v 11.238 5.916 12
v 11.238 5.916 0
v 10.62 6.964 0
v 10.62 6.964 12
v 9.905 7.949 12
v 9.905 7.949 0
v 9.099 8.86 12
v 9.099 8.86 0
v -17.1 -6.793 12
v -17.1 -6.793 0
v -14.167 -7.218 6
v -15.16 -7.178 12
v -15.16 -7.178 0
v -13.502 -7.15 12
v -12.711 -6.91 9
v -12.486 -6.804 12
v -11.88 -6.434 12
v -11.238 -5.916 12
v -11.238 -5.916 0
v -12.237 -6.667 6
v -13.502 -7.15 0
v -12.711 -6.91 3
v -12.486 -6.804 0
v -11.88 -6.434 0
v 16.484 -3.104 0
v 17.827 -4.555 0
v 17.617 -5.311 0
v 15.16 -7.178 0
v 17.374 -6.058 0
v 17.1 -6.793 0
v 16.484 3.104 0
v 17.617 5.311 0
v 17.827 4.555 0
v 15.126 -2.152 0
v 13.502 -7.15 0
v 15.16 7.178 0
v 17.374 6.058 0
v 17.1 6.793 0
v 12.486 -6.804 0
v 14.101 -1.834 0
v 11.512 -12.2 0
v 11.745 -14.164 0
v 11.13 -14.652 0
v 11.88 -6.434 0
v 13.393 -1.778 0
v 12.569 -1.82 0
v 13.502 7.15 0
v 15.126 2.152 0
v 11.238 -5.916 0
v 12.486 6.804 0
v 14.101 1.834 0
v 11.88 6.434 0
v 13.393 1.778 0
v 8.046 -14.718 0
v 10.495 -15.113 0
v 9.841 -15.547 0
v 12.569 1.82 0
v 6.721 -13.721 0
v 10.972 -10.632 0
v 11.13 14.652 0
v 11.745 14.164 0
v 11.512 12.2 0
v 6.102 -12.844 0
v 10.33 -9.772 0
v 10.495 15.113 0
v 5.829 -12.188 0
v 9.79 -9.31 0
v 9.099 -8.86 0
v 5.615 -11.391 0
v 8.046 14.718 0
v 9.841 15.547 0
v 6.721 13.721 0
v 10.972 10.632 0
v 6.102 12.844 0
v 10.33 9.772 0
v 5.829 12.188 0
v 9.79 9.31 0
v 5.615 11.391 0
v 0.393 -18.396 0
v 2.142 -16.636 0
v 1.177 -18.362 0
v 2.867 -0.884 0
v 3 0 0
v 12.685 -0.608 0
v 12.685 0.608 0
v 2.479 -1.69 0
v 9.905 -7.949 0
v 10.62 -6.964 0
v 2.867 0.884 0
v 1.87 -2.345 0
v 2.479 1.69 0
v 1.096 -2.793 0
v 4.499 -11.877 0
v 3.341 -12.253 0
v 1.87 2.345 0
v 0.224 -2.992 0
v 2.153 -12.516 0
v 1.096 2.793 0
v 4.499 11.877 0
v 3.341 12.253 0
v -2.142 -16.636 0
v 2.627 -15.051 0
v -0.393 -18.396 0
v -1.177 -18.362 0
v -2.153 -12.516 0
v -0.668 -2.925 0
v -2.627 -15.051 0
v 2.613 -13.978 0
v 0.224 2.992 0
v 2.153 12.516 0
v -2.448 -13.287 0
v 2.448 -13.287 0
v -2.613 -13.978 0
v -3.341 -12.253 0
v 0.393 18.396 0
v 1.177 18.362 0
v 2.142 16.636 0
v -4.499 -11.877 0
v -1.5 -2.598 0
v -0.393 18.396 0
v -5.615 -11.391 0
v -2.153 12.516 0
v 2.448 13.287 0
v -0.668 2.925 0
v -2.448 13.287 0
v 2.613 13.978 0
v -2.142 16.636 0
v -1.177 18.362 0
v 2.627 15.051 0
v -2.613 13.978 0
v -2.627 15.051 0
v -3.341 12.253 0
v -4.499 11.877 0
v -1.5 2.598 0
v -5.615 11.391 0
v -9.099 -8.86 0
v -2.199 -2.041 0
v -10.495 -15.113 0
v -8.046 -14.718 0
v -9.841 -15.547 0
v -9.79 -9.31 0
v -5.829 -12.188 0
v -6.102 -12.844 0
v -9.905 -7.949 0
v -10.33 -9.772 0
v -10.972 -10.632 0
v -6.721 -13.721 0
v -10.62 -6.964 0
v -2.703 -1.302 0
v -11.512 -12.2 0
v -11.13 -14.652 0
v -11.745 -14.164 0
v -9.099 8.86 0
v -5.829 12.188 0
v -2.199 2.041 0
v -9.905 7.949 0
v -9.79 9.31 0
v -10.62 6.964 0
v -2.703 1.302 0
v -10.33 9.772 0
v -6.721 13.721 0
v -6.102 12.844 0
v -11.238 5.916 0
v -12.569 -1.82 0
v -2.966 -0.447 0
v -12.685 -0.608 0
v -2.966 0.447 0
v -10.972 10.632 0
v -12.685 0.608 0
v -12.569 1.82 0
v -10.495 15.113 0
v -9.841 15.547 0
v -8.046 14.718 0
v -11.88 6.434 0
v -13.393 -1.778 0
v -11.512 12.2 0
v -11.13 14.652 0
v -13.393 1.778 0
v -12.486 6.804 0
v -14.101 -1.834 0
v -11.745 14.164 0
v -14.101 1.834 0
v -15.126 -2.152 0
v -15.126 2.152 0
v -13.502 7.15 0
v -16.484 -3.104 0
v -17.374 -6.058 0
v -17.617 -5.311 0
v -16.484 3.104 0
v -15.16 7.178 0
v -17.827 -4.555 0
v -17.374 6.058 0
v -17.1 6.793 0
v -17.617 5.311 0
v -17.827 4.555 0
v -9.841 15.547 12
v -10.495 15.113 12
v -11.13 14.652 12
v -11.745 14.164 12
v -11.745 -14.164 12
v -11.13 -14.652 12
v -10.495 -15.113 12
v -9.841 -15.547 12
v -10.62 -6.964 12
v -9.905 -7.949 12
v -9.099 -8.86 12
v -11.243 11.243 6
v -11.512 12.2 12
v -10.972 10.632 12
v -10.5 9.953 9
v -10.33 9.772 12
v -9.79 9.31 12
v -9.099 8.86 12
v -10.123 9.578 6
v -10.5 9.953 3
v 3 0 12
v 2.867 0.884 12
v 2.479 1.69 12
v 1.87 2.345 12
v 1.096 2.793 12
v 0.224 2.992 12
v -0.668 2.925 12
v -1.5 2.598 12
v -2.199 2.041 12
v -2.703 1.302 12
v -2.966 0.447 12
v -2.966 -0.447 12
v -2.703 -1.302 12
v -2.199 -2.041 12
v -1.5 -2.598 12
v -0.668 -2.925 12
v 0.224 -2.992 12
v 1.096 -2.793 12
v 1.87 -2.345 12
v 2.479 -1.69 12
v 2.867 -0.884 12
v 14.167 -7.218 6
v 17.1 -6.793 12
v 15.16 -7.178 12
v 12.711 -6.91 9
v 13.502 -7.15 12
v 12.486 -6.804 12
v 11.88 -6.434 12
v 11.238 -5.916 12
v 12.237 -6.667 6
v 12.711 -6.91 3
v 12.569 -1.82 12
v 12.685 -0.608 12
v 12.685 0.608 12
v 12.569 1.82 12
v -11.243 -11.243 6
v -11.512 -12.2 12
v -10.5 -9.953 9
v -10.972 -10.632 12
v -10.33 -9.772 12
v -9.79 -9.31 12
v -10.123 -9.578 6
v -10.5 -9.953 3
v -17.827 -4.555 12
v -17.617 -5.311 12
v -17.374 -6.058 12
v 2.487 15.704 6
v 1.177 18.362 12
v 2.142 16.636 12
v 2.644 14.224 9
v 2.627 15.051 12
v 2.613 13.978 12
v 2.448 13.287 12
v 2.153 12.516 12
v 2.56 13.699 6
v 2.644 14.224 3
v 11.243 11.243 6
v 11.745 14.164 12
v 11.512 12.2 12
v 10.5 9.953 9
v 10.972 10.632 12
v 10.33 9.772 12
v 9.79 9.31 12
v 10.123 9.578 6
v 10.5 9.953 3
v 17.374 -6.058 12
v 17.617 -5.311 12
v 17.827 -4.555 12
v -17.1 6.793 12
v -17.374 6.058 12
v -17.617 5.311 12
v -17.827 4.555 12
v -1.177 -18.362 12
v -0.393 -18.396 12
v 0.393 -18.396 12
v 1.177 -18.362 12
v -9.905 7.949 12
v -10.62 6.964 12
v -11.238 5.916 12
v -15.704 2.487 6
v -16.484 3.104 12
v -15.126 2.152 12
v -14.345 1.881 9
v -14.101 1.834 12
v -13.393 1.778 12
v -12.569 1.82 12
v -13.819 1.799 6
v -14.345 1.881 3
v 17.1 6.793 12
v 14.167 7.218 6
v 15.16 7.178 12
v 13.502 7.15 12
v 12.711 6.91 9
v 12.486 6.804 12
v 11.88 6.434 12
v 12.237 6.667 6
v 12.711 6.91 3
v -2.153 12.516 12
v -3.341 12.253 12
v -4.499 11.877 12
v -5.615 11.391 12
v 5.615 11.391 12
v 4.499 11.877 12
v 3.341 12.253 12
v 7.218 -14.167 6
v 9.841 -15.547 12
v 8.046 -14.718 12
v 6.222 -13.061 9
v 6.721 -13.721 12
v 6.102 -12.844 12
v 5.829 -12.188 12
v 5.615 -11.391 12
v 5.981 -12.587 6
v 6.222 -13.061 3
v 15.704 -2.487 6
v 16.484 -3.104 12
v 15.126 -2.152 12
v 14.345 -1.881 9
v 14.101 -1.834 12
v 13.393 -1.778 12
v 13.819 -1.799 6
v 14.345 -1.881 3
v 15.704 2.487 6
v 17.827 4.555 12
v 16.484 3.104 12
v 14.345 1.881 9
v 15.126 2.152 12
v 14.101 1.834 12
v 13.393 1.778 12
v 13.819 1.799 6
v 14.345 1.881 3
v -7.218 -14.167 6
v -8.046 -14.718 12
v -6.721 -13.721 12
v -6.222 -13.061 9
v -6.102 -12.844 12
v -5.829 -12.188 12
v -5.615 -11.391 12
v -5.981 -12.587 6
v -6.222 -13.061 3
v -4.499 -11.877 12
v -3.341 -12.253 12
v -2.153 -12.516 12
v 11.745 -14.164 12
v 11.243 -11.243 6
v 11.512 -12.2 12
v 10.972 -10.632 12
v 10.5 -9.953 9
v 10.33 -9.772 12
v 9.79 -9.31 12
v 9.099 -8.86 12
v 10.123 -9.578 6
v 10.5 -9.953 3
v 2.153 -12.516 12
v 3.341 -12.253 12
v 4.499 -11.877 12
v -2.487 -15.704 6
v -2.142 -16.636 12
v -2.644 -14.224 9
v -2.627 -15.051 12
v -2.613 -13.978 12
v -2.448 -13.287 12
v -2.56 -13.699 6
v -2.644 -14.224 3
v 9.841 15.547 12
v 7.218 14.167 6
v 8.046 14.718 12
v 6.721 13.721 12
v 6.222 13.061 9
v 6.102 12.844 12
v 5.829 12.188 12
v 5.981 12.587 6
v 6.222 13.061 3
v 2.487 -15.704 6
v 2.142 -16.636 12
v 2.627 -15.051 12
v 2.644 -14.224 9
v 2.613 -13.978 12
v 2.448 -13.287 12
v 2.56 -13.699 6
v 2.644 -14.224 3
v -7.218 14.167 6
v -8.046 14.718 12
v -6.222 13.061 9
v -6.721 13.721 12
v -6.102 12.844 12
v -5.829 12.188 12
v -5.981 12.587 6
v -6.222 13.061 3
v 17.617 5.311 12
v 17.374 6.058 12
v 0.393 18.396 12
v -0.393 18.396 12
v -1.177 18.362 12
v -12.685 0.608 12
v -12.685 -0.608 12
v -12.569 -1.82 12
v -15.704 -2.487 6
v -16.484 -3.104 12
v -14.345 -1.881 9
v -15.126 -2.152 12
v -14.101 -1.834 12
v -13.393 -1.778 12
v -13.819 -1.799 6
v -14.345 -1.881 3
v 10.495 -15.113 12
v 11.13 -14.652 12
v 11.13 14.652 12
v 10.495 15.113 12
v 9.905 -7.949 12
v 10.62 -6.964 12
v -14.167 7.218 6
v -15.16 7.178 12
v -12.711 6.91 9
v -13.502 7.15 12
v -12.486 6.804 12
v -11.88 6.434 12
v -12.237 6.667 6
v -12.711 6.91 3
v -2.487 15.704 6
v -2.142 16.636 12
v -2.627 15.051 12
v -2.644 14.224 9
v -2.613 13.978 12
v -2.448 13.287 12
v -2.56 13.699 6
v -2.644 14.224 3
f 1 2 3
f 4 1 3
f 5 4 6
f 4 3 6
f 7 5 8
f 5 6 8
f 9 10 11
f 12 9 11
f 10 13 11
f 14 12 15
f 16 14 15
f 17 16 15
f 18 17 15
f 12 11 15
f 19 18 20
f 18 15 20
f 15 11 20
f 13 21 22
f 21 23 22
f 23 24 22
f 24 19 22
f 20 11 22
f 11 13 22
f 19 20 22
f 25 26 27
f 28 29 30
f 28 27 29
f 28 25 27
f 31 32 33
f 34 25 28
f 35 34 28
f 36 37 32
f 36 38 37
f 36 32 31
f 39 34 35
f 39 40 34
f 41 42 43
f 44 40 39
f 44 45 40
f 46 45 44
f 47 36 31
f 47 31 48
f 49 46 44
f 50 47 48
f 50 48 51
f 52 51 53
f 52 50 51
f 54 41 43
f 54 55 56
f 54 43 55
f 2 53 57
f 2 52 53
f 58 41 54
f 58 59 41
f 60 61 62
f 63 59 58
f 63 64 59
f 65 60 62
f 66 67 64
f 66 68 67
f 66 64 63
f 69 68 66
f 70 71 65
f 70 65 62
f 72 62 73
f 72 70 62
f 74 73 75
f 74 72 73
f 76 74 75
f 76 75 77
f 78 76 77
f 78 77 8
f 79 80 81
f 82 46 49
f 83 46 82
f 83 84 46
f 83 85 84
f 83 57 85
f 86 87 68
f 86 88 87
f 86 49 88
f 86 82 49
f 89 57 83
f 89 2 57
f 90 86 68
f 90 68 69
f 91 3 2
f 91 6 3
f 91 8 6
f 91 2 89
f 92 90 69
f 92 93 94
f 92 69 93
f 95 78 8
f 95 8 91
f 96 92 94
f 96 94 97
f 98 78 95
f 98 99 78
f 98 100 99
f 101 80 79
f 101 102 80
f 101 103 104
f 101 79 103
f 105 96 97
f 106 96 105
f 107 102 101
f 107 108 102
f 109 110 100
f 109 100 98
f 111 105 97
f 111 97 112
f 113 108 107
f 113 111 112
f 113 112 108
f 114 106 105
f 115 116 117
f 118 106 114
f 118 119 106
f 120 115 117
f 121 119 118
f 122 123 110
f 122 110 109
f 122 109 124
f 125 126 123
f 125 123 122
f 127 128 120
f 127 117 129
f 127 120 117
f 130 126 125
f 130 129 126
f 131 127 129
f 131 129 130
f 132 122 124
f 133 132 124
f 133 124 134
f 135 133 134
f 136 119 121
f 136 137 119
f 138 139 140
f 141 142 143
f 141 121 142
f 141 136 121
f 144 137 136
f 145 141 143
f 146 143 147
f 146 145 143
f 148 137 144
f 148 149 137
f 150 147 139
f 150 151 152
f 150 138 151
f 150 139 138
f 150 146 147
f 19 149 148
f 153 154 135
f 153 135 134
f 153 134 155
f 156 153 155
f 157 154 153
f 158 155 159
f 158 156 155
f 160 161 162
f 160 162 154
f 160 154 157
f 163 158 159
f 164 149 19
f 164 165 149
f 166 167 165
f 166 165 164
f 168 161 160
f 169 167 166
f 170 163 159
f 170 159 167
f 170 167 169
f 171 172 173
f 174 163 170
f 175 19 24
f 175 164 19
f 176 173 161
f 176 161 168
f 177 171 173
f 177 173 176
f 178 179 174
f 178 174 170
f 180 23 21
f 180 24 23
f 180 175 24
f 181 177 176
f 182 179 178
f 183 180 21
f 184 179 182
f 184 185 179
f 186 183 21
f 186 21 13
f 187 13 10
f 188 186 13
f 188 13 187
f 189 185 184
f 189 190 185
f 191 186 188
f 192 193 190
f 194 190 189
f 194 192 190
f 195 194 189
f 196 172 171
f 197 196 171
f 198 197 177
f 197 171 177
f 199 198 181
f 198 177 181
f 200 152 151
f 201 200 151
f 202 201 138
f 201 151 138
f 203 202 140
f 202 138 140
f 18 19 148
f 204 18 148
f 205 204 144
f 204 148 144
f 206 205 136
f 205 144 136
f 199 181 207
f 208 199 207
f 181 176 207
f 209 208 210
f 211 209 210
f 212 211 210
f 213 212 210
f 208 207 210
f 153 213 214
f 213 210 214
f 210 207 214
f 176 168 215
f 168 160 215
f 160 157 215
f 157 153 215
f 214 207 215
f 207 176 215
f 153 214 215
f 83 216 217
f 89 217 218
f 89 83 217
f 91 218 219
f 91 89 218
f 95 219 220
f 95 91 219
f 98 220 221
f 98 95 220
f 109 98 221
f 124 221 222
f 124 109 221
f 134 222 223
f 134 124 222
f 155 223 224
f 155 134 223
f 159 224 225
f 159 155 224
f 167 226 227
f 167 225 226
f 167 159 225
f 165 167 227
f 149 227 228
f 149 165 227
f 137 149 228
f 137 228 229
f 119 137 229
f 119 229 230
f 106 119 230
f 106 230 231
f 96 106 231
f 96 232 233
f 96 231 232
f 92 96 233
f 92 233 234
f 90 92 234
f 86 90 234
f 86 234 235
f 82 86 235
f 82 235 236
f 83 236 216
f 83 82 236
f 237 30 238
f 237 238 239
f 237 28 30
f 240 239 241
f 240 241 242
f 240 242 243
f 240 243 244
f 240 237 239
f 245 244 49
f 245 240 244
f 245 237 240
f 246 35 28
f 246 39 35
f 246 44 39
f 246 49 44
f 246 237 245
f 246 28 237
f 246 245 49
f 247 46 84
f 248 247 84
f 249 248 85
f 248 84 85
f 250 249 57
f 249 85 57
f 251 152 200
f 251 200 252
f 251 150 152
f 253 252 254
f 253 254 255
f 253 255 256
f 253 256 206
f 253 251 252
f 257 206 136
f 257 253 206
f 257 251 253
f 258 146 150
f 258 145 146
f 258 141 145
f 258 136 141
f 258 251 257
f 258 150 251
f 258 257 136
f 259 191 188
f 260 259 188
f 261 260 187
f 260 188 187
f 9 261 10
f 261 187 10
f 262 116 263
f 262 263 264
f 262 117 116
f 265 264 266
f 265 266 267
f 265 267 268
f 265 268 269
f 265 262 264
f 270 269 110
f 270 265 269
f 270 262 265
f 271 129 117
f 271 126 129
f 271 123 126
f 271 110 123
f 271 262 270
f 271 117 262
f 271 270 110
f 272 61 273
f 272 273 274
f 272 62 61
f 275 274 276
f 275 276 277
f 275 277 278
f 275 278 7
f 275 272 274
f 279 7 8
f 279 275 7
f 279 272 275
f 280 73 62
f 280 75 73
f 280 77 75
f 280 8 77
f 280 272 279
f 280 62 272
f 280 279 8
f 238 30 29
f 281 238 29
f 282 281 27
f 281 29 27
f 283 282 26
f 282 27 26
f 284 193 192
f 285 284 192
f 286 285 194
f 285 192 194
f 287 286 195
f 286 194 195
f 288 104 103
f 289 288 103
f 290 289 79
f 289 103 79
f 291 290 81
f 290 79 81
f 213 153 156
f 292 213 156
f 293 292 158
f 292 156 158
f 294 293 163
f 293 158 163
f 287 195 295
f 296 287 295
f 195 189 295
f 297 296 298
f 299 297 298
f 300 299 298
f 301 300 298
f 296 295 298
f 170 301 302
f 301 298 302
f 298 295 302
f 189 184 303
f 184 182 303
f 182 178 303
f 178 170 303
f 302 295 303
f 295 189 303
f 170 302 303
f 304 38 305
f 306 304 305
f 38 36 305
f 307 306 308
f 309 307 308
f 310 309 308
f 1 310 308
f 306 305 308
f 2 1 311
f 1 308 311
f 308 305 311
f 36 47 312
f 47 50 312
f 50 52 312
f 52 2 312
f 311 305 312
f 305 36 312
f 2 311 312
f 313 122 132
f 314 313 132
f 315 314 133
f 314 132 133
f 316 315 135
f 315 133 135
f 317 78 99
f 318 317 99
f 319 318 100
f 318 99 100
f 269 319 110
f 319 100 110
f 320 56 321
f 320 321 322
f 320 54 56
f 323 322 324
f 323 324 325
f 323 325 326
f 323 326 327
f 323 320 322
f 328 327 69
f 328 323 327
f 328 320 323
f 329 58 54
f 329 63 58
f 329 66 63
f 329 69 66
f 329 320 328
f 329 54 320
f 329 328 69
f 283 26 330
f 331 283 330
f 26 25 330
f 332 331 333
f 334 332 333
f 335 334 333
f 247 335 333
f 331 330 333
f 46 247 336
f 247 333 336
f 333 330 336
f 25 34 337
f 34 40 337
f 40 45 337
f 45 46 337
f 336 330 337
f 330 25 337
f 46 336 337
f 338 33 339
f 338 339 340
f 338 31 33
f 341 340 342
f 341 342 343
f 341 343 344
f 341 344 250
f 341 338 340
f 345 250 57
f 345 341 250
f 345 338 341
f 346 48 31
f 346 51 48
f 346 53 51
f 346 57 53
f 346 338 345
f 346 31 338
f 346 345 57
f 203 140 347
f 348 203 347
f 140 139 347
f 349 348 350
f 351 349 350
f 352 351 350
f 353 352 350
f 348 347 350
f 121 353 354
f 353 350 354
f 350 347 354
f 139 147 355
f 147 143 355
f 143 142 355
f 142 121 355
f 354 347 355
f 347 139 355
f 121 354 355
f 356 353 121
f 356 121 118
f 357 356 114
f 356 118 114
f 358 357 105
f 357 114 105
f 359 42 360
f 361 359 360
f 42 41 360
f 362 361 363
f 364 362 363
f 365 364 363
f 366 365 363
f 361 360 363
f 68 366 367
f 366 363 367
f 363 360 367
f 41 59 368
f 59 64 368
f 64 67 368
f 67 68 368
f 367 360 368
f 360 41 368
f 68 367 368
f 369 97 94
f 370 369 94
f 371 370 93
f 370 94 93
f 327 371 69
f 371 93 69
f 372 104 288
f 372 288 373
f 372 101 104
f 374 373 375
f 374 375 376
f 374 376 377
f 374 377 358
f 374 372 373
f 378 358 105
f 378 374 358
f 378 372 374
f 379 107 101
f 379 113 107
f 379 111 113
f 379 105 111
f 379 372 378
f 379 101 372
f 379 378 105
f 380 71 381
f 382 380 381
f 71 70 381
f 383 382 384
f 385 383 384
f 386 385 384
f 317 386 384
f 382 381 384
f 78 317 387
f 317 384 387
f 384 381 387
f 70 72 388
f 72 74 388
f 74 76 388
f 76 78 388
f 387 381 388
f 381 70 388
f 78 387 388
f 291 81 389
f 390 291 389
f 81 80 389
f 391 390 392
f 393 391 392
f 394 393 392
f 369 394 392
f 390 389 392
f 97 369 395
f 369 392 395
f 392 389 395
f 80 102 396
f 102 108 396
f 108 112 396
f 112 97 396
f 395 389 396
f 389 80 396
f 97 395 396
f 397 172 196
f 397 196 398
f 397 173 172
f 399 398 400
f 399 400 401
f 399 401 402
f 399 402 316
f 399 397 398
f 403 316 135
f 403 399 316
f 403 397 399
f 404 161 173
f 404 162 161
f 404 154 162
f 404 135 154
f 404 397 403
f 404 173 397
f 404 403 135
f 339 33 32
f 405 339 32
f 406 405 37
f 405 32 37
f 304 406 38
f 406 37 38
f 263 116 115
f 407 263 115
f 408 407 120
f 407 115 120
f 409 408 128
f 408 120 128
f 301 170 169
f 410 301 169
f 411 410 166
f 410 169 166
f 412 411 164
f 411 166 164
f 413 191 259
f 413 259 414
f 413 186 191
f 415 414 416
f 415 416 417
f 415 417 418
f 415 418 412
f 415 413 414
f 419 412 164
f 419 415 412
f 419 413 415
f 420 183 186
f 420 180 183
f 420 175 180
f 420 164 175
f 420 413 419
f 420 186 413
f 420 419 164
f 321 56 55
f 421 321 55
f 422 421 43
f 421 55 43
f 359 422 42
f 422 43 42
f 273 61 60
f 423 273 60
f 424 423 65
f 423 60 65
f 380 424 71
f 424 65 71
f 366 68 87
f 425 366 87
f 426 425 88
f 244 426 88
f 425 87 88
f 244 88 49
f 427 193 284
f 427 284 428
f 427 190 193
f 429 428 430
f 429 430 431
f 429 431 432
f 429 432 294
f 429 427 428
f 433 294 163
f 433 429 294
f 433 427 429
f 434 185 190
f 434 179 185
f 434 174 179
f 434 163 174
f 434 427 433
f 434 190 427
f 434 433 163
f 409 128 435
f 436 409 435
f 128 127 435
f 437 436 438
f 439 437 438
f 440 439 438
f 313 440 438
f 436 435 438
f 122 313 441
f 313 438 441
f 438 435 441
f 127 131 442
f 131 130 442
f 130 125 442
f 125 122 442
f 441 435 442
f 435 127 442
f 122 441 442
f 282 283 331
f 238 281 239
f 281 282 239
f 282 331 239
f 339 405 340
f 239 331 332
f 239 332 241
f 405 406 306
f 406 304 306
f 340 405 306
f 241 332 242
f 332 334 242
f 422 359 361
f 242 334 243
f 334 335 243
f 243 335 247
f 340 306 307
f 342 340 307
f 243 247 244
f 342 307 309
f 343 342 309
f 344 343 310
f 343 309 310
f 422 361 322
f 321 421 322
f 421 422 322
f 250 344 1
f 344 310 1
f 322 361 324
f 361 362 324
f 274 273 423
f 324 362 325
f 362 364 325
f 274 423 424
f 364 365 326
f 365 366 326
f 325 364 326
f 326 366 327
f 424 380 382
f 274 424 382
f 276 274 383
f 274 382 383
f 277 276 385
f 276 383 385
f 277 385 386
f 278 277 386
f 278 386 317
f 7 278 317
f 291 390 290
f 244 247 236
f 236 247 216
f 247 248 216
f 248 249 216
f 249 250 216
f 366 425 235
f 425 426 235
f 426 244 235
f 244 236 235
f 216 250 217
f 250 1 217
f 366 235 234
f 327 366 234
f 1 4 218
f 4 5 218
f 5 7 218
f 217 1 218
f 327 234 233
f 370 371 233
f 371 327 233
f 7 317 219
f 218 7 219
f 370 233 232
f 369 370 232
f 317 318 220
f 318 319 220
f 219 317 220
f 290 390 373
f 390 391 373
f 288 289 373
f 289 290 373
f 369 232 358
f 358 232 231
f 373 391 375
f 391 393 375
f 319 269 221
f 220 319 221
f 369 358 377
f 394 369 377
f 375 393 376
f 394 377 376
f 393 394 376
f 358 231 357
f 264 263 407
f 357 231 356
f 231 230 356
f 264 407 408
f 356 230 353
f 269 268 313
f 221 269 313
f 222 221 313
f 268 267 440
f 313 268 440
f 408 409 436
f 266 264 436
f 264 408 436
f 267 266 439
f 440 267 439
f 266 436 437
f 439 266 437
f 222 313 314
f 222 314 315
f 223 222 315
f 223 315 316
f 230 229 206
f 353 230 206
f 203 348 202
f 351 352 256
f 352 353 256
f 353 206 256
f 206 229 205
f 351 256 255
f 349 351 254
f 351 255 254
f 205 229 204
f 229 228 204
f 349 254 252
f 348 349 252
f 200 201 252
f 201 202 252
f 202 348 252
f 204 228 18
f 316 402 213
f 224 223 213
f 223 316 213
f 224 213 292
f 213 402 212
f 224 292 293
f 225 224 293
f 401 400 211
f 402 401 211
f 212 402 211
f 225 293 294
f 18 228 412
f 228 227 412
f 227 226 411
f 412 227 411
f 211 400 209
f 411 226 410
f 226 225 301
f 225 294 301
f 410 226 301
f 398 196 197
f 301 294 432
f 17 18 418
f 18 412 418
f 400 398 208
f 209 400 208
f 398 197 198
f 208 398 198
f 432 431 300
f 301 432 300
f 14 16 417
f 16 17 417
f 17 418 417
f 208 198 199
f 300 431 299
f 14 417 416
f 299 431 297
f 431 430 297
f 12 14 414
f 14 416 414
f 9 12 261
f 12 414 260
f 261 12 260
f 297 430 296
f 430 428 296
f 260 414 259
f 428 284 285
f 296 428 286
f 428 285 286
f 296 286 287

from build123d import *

# Parameters (mm, degrees)
F1_R     = 3
F2_DEPTH = 12
F3_COUNT = 10


# Not quite as in the source:
# - the dataset's text gives a spline's control points without its knots; the knots are read off the source's solid


with BuildPart() as f2:
    # F1 (on Top) → F2 (new body)
    with BuildSketch(Plane.XY):
        with BuildLine():
            add(Edge.make_bspline(
                [(1.1767889059, 18.3623301318), (1.6271784454, 17.7151013205), (2.818419618, 15.5665856482), (2.7289393763, 13.8155375104), (2.1532964325, 12.516122182)],
                knots=[0, 0, 0, 0, 0.4901902273, 1, 1, 1, 1], degree=3))
            ThreePointArc((1.1767889059, 18.3623301318), (0, 18.4), (-1.1767889059, 18.3623301318))
            add(Edge.make_bspline(
                [(-1.1767889059, 18.3623301318), (-1.6271784454, 17.7151013205), (-2.818419618, 15.5665856482), (-2.7289393763, 13.8155375104), (-2.1532964325, 12.516122182)],
                knots=[0, 0, 0, 0, 0.4901902273, 1, 1, 1, 1], degree=3))
            ThreePointArc((-2.1532964325, 12.516122182), (0, -12.7), (2.1532964325, 12.516122182))
        make_face()
        Circle(F1_R, mode=Mode.SUBTRACT)
    extrude(amount=F2_DEPTH)

    # F3: F2 ×10 about axis
    f3_axis = Axis((0, 0, 0), (0, 0, -1))


with BuildPart() as f2_1:
    add(f2.part)
    for i in range(1, F3_COUNT):
        add(f2.part.rotate(f3_axis, i * 360 / F3_COUNT))


solid = f2_1.part
